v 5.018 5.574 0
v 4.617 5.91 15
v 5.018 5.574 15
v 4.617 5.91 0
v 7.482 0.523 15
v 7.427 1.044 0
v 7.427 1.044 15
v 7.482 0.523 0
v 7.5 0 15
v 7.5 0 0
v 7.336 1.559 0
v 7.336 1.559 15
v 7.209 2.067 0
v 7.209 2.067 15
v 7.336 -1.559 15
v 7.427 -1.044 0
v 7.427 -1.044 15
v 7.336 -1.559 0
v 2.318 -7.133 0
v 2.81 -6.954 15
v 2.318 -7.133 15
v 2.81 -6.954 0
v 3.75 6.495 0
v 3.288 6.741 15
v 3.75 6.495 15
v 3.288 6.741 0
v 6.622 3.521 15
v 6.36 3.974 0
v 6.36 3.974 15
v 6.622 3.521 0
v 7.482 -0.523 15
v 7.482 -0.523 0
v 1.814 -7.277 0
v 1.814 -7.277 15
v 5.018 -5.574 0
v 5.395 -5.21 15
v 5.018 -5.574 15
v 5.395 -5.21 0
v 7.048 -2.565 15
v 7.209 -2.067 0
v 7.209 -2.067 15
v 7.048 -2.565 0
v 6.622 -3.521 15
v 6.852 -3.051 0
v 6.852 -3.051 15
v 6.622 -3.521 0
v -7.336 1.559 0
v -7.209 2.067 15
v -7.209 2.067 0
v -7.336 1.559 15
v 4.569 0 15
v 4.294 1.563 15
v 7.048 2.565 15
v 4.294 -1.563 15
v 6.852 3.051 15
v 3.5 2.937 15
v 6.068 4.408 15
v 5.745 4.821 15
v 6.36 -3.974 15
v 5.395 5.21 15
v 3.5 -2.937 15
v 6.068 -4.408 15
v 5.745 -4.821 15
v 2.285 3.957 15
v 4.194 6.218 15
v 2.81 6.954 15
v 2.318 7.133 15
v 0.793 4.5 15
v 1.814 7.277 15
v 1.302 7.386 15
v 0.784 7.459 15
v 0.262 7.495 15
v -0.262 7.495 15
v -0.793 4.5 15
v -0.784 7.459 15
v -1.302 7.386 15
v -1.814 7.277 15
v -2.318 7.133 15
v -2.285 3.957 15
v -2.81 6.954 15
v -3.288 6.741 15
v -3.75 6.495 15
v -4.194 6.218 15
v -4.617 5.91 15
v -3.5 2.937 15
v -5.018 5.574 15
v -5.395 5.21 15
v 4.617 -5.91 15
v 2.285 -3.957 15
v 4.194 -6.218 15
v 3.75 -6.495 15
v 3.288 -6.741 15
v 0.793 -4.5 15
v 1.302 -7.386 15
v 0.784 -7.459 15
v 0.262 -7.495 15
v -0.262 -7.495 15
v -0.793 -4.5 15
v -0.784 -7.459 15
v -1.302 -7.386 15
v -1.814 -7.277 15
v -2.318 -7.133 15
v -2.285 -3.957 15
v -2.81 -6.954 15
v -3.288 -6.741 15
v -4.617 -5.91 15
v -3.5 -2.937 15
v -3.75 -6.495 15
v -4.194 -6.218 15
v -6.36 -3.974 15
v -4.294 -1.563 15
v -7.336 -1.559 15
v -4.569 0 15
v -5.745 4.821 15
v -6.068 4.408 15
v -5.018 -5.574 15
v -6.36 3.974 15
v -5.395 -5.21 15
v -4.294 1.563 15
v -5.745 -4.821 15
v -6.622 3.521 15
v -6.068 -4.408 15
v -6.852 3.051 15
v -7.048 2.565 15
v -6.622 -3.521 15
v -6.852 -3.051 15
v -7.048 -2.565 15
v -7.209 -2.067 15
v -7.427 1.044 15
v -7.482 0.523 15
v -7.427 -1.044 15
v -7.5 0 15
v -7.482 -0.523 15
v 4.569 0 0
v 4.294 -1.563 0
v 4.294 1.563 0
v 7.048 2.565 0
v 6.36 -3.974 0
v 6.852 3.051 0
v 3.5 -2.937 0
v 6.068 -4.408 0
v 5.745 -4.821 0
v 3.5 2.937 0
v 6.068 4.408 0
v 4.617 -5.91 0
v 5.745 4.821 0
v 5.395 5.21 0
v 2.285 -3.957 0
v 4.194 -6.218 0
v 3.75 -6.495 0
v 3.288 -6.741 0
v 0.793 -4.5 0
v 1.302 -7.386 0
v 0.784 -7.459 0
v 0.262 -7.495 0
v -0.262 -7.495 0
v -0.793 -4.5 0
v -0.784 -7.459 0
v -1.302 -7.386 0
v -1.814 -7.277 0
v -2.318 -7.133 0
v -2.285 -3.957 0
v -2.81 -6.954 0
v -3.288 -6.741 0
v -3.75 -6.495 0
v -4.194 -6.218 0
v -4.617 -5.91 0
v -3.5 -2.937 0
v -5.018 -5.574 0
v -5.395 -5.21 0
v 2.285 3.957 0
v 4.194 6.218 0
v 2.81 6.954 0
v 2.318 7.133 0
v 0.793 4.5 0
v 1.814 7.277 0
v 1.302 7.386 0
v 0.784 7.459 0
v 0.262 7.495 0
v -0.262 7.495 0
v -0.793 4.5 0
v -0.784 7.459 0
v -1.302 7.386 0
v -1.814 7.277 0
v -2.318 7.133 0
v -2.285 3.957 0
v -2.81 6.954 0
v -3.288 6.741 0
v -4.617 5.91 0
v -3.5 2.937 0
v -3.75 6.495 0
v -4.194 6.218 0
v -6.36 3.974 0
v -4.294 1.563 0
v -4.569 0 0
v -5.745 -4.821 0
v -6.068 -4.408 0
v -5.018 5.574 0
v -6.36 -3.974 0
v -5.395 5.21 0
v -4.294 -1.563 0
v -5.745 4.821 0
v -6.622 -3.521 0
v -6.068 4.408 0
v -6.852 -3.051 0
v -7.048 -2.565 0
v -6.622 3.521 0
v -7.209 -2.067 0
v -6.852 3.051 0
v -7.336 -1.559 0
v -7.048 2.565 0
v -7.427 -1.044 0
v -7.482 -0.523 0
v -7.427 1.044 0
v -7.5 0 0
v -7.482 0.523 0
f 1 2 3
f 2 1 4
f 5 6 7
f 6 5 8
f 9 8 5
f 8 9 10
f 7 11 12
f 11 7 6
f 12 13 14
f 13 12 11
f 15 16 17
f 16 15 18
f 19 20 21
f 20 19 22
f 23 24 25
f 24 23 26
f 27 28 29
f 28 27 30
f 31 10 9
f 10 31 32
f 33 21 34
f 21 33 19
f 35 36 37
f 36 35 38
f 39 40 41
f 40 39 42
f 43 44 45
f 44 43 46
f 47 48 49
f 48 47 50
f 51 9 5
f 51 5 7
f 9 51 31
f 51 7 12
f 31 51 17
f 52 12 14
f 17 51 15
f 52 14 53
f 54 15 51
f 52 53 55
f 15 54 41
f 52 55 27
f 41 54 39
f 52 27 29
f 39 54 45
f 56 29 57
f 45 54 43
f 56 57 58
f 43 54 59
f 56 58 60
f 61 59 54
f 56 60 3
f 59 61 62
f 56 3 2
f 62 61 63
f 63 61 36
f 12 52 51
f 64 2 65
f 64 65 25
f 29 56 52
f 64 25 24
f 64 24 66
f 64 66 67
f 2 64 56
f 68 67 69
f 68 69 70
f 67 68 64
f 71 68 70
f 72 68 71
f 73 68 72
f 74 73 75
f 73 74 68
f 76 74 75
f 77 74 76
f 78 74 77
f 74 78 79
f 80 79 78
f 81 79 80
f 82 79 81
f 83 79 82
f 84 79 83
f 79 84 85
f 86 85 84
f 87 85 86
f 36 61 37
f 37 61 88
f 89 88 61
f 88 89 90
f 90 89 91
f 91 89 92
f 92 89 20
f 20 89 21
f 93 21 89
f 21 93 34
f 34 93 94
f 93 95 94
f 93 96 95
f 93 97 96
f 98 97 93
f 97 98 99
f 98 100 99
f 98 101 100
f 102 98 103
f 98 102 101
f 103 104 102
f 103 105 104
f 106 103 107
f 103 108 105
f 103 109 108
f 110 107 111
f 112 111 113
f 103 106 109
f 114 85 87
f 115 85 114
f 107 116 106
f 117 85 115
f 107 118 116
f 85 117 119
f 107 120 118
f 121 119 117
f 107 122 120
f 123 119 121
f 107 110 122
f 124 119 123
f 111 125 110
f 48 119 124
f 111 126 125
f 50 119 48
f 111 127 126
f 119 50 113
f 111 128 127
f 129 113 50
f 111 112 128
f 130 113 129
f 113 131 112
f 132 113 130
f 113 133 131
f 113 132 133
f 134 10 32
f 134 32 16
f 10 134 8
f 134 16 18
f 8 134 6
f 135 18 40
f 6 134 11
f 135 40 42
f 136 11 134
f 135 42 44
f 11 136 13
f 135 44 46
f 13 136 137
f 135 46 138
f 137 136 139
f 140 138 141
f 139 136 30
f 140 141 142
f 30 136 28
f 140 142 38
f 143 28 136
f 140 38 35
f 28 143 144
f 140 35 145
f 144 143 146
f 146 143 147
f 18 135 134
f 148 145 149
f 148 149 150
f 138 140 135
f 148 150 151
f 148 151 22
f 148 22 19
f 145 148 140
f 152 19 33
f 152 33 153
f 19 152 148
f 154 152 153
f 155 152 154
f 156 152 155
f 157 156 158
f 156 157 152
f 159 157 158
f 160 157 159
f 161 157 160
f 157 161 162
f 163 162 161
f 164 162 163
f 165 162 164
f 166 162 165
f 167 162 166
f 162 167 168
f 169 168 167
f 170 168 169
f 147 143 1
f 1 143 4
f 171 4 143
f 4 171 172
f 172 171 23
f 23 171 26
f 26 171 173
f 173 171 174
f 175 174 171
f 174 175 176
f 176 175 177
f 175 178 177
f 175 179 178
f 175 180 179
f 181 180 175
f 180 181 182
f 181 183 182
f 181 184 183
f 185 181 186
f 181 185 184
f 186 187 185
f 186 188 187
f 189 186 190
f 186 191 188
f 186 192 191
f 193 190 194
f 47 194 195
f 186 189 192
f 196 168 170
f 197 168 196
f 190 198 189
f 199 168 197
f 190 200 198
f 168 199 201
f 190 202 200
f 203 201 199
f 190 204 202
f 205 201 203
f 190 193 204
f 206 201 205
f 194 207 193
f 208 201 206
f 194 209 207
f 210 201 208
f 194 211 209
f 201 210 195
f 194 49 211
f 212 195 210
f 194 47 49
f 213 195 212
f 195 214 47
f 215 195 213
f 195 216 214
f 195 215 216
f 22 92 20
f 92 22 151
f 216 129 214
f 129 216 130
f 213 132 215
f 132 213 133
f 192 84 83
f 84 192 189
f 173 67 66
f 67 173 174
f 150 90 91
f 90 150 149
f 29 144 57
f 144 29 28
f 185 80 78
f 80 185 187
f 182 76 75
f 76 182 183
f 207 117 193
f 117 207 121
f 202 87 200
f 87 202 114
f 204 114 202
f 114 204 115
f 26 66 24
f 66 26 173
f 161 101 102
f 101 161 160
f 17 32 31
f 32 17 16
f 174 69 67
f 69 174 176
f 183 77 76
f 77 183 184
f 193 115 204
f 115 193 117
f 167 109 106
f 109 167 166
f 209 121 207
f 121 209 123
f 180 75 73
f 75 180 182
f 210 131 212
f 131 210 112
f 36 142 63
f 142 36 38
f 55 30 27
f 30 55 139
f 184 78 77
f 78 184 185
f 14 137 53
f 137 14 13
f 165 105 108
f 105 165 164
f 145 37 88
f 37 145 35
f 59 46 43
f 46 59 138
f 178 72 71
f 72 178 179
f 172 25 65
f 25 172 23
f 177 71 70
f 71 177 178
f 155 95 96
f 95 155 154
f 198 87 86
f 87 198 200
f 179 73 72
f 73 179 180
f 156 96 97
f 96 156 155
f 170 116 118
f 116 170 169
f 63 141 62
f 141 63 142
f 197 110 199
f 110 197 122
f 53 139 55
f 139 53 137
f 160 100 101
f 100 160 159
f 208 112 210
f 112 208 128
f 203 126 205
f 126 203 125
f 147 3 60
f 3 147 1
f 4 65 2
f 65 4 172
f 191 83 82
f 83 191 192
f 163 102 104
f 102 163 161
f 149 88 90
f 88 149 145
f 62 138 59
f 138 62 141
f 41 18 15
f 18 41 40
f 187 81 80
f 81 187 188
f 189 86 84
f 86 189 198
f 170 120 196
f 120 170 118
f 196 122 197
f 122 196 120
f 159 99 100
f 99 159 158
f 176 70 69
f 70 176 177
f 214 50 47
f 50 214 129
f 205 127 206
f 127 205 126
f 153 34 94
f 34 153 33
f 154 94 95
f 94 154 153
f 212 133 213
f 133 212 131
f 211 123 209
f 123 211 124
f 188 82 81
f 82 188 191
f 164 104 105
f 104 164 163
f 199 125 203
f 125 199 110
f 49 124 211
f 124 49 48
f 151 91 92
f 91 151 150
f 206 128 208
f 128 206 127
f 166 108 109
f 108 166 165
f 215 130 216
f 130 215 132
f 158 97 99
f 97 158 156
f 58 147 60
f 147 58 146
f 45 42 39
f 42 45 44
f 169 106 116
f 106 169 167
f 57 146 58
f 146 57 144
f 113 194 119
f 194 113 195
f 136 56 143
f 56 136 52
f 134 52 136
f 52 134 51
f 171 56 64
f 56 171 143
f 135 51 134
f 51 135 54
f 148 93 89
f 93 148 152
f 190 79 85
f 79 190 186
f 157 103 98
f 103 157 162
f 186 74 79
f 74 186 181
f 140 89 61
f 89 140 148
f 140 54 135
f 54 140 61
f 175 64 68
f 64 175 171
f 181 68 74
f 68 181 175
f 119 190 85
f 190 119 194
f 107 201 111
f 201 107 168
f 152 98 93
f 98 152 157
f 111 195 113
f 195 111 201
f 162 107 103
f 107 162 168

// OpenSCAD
// file: polyhole.scad
// The Cylinder is dead! Long live the Cylinder!
// A module for a polyhole by radius, based on Nophead's work.

module polyhole(h, r, cent = false)
{
    n = max(round(4 * r), 3);
    cylinder(h = h, r = r / cos(180 / n), $fn = n, center = cent);
}
// main file
use<polyhole.scad>

LeadSpacer();

module LeadSpacer()
{
    difference()
    {
        cylinder(h = 15, r = 15/2, $fn = 90);
        polyhole(15, 9/2);
    }
}
